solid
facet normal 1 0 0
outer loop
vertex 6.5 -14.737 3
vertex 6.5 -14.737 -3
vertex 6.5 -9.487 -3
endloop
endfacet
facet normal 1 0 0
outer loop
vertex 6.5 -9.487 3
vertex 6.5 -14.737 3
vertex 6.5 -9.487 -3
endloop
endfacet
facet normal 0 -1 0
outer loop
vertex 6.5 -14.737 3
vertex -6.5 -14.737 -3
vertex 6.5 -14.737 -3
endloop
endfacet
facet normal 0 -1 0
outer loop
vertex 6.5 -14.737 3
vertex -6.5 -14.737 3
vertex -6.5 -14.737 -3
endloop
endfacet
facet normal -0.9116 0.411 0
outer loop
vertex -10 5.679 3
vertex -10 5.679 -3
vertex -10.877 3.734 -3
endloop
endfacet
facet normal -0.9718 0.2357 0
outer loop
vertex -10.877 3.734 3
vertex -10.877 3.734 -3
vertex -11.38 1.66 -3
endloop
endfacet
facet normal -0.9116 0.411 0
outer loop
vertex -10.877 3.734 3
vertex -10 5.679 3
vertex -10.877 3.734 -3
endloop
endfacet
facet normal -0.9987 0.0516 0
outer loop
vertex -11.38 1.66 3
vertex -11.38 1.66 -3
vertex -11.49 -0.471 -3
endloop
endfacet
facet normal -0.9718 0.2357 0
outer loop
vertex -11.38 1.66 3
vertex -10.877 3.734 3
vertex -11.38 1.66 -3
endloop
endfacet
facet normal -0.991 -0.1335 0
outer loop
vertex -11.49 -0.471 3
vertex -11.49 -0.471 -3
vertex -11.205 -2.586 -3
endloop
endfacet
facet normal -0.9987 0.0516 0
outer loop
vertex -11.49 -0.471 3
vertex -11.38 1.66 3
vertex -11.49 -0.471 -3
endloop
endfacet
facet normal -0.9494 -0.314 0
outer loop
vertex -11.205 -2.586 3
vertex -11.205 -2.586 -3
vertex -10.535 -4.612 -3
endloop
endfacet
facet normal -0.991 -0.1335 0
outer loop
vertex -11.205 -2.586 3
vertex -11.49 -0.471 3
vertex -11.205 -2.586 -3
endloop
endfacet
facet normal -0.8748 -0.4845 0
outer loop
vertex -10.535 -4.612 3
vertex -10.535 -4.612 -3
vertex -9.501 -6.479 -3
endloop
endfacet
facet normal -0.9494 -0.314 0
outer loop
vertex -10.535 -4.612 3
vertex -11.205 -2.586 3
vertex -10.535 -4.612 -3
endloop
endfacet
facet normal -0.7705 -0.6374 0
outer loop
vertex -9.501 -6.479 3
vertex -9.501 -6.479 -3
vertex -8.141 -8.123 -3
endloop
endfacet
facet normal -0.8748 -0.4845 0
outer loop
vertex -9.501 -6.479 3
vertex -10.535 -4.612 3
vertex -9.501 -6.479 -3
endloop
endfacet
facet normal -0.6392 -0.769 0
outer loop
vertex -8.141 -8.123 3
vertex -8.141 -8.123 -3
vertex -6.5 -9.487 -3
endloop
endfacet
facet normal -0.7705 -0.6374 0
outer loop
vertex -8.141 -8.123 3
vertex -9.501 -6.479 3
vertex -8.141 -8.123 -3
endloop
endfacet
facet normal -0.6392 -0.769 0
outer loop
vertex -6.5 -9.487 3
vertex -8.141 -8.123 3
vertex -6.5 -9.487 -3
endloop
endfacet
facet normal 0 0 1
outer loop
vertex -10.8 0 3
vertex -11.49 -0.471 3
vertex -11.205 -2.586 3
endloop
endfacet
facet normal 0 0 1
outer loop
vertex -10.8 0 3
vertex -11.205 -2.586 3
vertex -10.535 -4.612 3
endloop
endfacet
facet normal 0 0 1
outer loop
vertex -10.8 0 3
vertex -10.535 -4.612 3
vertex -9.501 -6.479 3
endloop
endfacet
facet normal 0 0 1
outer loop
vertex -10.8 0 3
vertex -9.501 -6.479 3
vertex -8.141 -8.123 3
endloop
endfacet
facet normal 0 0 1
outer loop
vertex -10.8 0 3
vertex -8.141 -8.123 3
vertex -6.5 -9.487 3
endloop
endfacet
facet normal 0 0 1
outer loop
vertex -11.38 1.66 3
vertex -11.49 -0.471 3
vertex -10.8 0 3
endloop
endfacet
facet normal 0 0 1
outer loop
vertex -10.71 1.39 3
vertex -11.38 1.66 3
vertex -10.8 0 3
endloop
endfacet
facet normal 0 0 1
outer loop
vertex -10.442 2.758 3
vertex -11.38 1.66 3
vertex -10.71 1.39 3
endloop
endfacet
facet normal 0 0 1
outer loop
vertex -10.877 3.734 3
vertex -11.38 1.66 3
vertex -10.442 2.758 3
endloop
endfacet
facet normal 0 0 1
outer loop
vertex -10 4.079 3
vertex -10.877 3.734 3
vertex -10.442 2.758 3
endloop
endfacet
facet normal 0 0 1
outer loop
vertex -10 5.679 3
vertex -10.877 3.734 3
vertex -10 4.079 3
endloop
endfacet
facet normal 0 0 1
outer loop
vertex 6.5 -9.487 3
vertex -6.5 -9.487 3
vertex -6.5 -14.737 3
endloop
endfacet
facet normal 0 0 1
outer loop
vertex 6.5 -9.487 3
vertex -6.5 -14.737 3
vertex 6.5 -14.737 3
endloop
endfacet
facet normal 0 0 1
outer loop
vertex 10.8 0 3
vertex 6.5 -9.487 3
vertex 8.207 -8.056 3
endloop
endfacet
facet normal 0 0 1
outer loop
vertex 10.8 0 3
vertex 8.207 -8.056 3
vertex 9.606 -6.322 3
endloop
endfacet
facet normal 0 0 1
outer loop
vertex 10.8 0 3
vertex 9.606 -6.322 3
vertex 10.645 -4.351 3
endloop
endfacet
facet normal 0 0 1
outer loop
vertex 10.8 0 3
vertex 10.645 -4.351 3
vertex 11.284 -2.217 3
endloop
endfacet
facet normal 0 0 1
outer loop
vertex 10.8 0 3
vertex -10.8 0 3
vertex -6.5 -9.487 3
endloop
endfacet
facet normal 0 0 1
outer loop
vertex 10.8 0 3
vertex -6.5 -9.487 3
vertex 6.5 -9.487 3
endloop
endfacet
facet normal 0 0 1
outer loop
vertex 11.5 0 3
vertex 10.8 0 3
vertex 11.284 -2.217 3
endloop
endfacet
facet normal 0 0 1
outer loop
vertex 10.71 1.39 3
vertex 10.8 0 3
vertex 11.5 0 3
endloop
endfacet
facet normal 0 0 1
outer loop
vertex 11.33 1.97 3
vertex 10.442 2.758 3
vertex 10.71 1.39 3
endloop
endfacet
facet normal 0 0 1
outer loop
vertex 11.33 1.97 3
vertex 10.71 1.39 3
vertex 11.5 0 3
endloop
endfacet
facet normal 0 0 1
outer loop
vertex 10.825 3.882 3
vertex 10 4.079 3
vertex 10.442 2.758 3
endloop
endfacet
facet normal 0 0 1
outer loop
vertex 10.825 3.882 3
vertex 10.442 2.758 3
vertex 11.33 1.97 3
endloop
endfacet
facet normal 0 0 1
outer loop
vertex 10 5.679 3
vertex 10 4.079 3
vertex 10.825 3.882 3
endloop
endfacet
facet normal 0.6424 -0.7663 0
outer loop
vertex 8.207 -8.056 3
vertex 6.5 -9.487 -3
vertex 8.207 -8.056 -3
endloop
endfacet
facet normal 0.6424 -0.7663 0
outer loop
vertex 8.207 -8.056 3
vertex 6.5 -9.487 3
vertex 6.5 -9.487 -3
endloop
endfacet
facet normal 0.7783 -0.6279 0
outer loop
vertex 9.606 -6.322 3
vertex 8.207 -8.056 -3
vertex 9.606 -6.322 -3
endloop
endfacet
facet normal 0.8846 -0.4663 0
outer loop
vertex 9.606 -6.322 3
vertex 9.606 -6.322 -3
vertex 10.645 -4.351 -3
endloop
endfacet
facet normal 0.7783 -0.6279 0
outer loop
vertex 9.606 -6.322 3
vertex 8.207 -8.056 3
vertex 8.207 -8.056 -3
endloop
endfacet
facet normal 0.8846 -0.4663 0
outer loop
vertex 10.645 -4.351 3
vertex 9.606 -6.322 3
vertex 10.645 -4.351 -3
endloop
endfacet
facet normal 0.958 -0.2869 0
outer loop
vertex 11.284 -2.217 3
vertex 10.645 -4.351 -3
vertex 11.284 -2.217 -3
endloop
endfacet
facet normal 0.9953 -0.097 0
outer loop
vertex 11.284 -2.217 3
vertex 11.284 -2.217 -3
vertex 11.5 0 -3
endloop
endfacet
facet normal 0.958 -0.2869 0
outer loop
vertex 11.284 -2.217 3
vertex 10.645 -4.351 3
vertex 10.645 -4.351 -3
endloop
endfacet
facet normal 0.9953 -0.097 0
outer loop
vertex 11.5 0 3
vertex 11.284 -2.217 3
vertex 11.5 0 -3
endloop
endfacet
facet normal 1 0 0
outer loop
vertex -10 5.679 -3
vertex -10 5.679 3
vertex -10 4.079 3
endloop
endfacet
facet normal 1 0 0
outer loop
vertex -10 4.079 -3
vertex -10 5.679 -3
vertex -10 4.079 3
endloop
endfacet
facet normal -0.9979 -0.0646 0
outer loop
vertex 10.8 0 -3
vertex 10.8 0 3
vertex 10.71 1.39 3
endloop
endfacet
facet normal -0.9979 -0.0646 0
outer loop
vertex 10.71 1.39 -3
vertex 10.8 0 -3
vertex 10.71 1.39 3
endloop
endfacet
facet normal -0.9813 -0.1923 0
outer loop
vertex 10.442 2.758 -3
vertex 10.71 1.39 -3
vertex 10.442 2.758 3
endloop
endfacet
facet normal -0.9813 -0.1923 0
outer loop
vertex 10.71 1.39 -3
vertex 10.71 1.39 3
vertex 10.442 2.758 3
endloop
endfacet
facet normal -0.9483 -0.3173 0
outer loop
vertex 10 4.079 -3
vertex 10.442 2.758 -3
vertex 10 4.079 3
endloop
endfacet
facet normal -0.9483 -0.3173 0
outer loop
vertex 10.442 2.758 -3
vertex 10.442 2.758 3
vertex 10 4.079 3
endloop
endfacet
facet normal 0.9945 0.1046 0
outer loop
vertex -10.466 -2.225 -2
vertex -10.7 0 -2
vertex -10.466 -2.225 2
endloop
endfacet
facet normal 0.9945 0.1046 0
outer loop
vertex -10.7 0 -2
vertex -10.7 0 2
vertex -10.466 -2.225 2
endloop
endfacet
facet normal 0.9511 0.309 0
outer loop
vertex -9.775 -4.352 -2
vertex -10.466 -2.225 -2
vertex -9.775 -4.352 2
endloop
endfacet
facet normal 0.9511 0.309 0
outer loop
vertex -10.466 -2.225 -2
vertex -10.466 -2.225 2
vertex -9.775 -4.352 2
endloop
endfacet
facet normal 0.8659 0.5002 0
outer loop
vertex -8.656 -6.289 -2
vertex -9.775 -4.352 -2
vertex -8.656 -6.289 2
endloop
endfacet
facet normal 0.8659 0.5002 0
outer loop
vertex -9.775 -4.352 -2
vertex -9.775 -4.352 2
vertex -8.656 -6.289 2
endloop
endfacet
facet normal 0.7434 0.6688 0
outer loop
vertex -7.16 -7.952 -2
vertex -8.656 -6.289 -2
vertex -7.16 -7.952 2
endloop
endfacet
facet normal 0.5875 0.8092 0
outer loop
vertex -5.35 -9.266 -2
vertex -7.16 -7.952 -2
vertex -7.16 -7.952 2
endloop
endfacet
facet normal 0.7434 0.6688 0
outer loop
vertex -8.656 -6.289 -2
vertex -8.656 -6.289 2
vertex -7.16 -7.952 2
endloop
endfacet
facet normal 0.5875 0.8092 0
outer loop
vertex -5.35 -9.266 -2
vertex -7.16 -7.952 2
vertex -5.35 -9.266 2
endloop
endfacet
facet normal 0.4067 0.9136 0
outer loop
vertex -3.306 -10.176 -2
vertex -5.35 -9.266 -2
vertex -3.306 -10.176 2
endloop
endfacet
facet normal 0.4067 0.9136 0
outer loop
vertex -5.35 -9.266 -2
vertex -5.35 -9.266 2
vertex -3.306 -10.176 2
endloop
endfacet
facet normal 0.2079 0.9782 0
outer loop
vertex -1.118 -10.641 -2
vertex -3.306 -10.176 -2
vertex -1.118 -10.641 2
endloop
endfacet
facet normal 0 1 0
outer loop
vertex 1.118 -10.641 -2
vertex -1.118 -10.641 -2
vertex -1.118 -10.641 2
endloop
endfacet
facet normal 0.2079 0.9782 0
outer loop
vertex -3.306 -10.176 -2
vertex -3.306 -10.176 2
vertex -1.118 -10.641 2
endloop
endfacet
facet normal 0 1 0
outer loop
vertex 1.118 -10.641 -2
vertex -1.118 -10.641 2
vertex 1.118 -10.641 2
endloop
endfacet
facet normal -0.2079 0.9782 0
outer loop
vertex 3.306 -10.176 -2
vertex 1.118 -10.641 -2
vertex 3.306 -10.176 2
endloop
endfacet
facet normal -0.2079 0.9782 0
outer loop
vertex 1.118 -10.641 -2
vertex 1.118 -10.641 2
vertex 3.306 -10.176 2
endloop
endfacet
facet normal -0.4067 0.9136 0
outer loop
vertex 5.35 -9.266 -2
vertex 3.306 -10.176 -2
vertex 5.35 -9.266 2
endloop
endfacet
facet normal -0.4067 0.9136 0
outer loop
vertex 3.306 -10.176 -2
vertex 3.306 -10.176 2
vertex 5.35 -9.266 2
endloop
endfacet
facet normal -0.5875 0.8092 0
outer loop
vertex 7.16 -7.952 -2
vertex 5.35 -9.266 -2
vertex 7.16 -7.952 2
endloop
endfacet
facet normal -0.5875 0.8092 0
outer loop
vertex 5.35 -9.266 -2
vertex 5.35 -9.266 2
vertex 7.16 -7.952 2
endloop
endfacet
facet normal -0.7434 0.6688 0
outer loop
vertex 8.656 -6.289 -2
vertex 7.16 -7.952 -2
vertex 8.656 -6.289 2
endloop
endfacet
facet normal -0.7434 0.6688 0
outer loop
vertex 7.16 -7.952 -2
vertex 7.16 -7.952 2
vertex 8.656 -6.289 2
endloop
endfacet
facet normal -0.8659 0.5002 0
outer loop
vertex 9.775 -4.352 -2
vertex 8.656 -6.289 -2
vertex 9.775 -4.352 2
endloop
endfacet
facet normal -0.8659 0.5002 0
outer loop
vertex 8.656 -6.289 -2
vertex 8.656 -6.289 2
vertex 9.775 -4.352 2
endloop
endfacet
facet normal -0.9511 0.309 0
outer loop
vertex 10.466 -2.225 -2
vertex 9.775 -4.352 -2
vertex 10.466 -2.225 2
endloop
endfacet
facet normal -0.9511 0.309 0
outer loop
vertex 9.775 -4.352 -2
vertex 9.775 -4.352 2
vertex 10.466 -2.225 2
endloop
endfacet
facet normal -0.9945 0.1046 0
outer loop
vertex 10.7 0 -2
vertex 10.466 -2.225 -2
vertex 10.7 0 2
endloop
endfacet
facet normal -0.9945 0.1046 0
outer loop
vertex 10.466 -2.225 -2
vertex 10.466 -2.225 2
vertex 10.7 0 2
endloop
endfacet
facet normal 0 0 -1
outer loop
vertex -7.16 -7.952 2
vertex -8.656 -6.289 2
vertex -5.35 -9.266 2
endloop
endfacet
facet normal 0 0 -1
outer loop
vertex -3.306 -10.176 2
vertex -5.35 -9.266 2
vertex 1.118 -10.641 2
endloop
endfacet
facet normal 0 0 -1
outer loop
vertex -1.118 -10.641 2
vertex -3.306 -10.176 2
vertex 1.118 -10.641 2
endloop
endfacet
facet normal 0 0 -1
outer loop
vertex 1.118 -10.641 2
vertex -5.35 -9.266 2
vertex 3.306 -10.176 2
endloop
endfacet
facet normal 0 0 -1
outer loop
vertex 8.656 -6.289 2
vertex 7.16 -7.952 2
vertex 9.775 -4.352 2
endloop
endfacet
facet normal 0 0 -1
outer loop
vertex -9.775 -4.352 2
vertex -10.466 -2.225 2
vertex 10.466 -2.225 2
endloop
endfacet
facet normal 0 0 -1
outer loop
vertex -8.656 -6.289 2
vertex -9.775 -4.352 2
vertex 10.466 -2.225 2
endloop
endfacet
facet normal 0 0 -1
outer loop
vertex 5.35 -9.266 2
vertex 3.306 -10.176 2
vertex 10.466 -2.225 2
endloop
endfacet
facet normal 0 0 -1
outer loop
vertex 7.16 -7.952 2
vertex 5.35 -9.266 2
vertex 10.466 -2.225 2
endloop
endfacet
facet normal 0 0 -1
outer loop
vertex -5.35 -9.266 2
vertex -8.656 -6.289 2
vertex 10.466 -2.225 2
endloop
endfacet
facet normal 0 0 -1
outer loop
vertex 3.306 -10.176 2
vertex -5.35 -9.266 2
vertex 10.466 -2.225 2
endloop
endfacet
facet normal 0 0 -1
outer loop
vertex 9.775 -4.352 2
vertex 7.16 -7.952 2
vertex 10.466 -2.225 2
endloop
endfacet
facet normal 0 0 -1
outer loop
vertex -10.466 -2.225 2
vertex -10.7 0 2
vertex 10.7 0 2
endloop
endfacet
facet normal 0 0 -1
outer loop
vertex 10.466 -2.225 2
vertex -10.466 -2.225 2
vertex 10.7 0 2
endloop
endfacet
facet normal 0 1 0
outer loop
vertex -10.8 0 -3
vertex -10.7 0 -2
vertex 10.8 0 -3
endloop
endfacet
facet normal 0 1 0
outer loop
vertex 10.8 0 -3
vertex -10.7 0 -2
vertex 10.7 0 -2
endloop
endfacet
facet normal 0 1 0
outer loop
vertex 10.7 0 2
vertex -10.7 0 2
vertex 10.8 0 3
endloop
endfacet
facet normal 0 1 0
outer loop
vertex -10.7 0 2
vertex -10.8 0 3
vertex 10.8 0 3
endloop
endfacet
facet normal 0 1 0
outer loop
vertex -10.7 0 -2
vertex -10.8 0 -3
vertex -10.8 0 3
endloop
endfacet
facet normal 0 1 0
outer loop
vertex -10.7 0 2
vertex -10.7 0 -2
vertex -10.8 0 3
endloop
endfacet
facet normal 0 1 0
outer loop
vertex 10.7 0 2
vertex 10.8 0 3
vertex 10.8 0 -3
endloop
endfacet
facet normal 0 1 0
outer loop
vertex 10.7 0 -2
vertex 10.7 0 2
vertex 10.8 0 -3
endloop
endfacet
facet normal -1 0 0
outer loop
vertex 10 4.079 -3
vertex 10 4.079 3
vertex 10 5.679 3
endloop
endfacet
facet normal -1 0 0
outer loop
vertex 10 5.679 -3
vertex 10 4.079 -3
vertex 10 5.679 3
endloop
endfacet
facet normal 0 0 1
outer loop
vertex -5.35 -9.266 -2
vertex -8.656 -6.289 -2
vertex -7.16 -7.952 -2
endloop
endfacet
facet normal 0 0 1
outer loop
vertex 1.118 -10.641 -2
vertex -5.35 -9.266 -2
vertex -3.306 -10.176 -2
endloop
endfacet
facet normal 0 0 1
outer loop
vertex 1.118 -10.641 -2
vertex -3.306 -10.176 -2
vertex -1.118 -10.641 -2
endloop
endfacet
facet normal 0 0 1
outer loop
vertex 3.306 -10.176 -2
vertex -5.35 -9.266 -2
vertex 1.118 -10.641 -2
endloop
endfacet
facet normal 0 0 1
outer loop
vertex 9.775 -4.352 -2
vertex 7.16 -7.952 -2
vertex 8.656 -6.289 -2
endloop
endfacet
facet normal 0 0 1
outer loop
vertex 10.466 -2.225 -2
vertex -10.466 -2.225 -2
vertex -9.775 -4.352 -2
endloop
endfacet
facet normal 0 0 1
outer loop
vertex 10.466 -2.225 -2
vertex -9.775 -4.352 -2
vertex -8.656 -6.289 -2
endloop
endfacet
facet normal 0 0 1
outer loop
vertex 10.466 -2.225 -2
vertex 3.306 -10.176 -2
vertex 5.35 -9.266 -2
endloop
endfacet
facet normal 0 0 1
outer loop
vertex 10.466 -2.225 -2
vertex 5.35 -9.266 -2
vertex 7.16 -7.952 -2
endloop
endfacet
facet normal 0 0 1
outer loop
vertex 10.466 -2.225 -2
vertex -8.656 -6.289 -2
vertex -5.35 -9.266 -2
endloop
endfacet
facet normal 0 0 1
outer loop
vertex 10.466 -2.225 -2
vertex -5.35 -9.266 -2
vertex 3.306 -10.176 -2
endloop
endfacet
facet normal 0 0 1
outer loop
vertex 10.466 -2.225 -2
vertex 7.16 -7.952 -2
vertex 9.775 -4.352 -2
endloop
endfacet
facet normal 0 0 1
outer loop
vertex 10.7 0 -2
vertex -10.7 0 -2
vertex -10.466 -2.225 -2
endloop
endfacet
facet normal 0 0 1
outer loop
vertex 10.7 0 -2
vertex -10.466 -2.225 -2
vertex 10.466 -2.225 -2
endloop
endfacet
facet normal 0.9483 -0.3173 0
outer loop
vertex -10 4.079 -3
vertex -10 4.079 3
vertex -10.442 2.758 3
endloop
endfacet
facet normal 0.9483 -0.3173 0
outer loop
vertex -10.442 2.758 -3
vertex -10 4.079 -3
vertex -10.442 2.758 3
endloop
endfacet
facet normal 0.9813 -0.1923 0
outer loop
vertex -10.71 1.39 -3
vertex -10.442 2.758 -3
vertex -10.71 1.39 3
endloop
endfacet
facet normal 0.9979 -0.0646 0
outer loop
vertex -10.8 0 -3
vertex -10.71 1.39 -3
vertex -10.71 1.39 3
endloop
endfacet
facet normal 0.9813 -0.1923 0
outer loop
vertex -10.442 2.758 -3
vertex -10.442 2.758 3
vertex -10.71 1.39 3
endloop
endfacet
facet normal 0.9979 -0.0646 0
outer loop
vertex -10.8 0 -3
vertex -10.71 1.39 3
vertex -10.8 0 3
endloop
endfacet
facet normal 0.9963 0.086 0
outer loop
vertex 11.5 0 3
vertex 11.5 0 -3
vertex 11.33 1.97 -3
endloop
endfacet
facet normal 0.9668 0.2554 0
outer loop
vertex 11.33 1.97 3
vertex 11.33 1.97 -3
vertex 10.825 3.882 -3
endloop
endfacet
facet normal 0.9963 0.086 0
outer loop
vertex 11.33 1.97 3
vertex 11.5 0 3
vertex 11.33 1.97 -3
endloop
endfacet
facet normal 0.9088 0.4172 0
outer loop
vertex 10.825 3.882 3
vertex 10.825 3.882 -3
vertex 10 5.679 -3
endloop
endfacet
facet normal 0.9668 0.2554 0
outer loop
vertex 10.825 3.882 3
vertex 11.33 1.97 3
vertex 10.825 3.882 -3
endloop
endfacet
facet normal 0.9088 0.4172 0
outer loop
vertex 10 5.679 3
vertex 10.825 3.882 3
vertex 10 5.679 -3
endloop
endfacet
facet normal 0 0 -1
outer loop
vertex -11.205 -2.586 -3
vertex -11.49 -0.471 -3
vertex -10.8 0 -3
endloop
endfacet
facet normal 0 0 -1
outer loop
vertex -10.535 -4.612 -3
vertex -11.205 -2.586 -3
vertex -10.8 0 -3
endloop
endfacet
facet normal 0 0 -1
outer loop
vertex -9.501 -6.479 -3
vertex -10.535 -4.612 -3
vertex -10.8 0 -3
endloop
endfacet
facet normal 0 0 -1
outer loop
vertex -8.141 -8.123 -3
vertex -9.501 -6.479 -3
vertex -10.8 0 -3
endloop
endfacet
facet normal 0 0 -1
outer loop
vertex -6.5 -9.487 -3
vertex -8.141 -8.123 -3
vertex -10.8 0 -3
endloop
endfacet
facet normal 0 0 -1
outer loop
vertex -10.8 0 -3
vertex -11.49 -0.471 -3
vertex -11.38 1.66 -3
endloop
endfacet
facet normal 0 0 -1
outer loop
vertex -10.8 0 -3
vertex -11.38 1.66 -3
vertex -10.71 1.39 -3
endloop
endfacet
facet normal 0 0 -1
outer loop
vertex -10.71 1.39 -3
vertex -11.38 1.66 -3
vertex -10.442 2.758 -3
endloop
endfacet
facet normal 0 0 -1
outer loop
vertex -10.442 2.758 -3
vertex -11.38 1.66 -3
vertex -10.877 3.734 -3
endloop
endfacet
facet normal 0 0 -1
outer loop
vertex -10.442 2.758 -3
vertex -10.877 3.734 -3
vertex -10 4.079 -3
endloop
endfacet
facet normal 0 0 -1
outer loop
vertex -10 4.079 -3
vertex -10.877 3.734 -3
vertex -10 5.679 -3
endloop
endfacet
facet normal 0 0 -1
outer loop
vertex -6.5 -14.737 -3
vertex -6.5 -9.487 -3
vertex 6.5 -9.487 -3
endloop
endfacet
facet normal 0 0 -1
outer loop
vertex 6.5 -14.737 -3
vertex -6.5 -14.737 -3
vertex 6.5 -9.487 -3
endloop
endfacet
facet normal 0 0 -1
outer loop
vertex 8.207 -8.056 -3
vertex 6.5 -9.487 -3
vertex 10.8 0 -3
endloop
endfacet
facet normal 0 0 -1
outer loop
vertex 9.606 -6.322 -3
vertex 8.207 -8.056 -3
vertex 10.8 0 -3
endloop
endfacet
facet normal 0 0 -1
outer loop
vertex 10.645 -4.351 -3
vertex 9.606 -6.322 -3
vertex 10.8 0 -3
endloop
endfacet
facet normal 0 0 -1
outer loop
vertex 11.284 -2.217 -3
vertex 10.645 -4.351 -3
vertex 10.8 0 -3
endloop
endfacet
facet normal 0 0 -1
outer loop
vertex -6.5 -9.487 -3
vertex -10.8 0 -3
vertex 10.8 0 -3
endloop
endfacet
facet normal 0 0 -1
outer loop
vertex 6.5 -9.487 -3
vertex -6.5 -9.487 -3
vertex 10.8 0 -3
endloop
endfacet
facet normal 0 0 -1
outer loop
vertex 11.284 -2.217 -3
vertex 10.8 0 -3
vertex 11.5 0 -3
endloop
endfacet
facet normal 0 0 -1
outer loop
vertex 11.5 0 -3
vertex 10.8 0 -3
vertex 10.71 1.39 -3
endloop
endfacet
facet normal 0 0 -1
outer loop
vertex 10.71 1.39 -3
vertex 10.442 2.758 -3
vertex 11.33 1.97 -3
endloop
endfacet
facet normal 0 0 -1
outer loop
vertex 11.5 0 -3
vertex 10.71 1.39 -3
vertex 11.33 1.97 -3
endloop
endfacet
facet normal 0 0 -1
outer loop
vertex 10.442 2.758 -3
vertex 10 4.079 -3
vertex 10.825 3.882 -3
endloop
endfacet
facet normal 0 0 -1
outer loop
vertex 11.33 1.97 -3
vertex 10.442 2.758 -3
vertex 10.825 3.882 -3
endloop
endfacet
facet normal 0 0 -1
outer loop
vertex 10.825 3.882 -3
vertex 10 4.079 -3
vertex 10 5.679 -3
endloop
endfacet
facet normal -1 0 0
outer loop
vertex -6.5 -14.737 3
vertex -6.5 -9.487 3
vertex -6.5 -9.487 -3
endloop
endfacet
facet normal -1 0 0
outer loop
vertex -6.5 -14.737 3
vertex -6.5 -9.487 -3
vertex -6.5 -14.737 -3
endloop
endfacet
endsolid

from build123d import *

# Parameters (mm, degrees)
F1_DEPTH = 3
F2_R     = 10.7
F3_DEPTH = 2
F5_DEPTH = 6.001


with BuildPart() as f1:
    # F0 (on Top) → F1 (new body, symmetric)
    with BuildSketch(Plane.XY):
        with BuildLine():
            ThreePointArc((6.5, -9.486833), (10.173495, -5.361903), (11.5, 0))
            ThreePointArc((11.5, 0), (-5.361903, 10.173495), (-6.5, -9.486833))
            ThreePointArc((-6.5, -9.486833), (0, -11.5), (6.5, -9.486833))
        make_face()
        with BuildLine():
            ThreePointArc((6.5, -9.486833), (0, -11.5), (-6.5, -9.486833))
            Line((-6.5, -9.486833), (-6.5, -14.736833))
            Line((-6.5, -14.736833), (6.5, -14.736833))
            Line((6.5, -14.736833), (6.5, -9.486833))
        make_face()
    extrude(amount=F1_DEPTH, both=True)

    # F2 (on Top) → F3 (cut, symmetric)
    with BuildSketch(Plane.XY):
        Circle(F2_R)
    extrude(amount=F3_DEPTH, both=True, mode=Mode.SUBTRACT)

    # F4 (on face) → F5 (cut, through all)
    with BuildSketch(Plane.XY.offset(3)):
        with BuildLine():
            Line((-10.8, 0), (10.8, 0))
            ThreePointArc((10.8, 0), (10.598113, 2.078461), (10, 4.079216))
            Line((10, 4.079216), (10, 14.079216))
            Line((10, 14.079216), (-10, 14.079216))
            Line((-10, 14.079216), (-10, 4.079216))
            ThreePointArc((-10, 4.079216), (-10.598113, 2.078461), (-10.8, 0))
        make_face()
    extrude(amount=-F5_DEPTH, mode=Mode.SUBTRACT)


solid = f1.part
